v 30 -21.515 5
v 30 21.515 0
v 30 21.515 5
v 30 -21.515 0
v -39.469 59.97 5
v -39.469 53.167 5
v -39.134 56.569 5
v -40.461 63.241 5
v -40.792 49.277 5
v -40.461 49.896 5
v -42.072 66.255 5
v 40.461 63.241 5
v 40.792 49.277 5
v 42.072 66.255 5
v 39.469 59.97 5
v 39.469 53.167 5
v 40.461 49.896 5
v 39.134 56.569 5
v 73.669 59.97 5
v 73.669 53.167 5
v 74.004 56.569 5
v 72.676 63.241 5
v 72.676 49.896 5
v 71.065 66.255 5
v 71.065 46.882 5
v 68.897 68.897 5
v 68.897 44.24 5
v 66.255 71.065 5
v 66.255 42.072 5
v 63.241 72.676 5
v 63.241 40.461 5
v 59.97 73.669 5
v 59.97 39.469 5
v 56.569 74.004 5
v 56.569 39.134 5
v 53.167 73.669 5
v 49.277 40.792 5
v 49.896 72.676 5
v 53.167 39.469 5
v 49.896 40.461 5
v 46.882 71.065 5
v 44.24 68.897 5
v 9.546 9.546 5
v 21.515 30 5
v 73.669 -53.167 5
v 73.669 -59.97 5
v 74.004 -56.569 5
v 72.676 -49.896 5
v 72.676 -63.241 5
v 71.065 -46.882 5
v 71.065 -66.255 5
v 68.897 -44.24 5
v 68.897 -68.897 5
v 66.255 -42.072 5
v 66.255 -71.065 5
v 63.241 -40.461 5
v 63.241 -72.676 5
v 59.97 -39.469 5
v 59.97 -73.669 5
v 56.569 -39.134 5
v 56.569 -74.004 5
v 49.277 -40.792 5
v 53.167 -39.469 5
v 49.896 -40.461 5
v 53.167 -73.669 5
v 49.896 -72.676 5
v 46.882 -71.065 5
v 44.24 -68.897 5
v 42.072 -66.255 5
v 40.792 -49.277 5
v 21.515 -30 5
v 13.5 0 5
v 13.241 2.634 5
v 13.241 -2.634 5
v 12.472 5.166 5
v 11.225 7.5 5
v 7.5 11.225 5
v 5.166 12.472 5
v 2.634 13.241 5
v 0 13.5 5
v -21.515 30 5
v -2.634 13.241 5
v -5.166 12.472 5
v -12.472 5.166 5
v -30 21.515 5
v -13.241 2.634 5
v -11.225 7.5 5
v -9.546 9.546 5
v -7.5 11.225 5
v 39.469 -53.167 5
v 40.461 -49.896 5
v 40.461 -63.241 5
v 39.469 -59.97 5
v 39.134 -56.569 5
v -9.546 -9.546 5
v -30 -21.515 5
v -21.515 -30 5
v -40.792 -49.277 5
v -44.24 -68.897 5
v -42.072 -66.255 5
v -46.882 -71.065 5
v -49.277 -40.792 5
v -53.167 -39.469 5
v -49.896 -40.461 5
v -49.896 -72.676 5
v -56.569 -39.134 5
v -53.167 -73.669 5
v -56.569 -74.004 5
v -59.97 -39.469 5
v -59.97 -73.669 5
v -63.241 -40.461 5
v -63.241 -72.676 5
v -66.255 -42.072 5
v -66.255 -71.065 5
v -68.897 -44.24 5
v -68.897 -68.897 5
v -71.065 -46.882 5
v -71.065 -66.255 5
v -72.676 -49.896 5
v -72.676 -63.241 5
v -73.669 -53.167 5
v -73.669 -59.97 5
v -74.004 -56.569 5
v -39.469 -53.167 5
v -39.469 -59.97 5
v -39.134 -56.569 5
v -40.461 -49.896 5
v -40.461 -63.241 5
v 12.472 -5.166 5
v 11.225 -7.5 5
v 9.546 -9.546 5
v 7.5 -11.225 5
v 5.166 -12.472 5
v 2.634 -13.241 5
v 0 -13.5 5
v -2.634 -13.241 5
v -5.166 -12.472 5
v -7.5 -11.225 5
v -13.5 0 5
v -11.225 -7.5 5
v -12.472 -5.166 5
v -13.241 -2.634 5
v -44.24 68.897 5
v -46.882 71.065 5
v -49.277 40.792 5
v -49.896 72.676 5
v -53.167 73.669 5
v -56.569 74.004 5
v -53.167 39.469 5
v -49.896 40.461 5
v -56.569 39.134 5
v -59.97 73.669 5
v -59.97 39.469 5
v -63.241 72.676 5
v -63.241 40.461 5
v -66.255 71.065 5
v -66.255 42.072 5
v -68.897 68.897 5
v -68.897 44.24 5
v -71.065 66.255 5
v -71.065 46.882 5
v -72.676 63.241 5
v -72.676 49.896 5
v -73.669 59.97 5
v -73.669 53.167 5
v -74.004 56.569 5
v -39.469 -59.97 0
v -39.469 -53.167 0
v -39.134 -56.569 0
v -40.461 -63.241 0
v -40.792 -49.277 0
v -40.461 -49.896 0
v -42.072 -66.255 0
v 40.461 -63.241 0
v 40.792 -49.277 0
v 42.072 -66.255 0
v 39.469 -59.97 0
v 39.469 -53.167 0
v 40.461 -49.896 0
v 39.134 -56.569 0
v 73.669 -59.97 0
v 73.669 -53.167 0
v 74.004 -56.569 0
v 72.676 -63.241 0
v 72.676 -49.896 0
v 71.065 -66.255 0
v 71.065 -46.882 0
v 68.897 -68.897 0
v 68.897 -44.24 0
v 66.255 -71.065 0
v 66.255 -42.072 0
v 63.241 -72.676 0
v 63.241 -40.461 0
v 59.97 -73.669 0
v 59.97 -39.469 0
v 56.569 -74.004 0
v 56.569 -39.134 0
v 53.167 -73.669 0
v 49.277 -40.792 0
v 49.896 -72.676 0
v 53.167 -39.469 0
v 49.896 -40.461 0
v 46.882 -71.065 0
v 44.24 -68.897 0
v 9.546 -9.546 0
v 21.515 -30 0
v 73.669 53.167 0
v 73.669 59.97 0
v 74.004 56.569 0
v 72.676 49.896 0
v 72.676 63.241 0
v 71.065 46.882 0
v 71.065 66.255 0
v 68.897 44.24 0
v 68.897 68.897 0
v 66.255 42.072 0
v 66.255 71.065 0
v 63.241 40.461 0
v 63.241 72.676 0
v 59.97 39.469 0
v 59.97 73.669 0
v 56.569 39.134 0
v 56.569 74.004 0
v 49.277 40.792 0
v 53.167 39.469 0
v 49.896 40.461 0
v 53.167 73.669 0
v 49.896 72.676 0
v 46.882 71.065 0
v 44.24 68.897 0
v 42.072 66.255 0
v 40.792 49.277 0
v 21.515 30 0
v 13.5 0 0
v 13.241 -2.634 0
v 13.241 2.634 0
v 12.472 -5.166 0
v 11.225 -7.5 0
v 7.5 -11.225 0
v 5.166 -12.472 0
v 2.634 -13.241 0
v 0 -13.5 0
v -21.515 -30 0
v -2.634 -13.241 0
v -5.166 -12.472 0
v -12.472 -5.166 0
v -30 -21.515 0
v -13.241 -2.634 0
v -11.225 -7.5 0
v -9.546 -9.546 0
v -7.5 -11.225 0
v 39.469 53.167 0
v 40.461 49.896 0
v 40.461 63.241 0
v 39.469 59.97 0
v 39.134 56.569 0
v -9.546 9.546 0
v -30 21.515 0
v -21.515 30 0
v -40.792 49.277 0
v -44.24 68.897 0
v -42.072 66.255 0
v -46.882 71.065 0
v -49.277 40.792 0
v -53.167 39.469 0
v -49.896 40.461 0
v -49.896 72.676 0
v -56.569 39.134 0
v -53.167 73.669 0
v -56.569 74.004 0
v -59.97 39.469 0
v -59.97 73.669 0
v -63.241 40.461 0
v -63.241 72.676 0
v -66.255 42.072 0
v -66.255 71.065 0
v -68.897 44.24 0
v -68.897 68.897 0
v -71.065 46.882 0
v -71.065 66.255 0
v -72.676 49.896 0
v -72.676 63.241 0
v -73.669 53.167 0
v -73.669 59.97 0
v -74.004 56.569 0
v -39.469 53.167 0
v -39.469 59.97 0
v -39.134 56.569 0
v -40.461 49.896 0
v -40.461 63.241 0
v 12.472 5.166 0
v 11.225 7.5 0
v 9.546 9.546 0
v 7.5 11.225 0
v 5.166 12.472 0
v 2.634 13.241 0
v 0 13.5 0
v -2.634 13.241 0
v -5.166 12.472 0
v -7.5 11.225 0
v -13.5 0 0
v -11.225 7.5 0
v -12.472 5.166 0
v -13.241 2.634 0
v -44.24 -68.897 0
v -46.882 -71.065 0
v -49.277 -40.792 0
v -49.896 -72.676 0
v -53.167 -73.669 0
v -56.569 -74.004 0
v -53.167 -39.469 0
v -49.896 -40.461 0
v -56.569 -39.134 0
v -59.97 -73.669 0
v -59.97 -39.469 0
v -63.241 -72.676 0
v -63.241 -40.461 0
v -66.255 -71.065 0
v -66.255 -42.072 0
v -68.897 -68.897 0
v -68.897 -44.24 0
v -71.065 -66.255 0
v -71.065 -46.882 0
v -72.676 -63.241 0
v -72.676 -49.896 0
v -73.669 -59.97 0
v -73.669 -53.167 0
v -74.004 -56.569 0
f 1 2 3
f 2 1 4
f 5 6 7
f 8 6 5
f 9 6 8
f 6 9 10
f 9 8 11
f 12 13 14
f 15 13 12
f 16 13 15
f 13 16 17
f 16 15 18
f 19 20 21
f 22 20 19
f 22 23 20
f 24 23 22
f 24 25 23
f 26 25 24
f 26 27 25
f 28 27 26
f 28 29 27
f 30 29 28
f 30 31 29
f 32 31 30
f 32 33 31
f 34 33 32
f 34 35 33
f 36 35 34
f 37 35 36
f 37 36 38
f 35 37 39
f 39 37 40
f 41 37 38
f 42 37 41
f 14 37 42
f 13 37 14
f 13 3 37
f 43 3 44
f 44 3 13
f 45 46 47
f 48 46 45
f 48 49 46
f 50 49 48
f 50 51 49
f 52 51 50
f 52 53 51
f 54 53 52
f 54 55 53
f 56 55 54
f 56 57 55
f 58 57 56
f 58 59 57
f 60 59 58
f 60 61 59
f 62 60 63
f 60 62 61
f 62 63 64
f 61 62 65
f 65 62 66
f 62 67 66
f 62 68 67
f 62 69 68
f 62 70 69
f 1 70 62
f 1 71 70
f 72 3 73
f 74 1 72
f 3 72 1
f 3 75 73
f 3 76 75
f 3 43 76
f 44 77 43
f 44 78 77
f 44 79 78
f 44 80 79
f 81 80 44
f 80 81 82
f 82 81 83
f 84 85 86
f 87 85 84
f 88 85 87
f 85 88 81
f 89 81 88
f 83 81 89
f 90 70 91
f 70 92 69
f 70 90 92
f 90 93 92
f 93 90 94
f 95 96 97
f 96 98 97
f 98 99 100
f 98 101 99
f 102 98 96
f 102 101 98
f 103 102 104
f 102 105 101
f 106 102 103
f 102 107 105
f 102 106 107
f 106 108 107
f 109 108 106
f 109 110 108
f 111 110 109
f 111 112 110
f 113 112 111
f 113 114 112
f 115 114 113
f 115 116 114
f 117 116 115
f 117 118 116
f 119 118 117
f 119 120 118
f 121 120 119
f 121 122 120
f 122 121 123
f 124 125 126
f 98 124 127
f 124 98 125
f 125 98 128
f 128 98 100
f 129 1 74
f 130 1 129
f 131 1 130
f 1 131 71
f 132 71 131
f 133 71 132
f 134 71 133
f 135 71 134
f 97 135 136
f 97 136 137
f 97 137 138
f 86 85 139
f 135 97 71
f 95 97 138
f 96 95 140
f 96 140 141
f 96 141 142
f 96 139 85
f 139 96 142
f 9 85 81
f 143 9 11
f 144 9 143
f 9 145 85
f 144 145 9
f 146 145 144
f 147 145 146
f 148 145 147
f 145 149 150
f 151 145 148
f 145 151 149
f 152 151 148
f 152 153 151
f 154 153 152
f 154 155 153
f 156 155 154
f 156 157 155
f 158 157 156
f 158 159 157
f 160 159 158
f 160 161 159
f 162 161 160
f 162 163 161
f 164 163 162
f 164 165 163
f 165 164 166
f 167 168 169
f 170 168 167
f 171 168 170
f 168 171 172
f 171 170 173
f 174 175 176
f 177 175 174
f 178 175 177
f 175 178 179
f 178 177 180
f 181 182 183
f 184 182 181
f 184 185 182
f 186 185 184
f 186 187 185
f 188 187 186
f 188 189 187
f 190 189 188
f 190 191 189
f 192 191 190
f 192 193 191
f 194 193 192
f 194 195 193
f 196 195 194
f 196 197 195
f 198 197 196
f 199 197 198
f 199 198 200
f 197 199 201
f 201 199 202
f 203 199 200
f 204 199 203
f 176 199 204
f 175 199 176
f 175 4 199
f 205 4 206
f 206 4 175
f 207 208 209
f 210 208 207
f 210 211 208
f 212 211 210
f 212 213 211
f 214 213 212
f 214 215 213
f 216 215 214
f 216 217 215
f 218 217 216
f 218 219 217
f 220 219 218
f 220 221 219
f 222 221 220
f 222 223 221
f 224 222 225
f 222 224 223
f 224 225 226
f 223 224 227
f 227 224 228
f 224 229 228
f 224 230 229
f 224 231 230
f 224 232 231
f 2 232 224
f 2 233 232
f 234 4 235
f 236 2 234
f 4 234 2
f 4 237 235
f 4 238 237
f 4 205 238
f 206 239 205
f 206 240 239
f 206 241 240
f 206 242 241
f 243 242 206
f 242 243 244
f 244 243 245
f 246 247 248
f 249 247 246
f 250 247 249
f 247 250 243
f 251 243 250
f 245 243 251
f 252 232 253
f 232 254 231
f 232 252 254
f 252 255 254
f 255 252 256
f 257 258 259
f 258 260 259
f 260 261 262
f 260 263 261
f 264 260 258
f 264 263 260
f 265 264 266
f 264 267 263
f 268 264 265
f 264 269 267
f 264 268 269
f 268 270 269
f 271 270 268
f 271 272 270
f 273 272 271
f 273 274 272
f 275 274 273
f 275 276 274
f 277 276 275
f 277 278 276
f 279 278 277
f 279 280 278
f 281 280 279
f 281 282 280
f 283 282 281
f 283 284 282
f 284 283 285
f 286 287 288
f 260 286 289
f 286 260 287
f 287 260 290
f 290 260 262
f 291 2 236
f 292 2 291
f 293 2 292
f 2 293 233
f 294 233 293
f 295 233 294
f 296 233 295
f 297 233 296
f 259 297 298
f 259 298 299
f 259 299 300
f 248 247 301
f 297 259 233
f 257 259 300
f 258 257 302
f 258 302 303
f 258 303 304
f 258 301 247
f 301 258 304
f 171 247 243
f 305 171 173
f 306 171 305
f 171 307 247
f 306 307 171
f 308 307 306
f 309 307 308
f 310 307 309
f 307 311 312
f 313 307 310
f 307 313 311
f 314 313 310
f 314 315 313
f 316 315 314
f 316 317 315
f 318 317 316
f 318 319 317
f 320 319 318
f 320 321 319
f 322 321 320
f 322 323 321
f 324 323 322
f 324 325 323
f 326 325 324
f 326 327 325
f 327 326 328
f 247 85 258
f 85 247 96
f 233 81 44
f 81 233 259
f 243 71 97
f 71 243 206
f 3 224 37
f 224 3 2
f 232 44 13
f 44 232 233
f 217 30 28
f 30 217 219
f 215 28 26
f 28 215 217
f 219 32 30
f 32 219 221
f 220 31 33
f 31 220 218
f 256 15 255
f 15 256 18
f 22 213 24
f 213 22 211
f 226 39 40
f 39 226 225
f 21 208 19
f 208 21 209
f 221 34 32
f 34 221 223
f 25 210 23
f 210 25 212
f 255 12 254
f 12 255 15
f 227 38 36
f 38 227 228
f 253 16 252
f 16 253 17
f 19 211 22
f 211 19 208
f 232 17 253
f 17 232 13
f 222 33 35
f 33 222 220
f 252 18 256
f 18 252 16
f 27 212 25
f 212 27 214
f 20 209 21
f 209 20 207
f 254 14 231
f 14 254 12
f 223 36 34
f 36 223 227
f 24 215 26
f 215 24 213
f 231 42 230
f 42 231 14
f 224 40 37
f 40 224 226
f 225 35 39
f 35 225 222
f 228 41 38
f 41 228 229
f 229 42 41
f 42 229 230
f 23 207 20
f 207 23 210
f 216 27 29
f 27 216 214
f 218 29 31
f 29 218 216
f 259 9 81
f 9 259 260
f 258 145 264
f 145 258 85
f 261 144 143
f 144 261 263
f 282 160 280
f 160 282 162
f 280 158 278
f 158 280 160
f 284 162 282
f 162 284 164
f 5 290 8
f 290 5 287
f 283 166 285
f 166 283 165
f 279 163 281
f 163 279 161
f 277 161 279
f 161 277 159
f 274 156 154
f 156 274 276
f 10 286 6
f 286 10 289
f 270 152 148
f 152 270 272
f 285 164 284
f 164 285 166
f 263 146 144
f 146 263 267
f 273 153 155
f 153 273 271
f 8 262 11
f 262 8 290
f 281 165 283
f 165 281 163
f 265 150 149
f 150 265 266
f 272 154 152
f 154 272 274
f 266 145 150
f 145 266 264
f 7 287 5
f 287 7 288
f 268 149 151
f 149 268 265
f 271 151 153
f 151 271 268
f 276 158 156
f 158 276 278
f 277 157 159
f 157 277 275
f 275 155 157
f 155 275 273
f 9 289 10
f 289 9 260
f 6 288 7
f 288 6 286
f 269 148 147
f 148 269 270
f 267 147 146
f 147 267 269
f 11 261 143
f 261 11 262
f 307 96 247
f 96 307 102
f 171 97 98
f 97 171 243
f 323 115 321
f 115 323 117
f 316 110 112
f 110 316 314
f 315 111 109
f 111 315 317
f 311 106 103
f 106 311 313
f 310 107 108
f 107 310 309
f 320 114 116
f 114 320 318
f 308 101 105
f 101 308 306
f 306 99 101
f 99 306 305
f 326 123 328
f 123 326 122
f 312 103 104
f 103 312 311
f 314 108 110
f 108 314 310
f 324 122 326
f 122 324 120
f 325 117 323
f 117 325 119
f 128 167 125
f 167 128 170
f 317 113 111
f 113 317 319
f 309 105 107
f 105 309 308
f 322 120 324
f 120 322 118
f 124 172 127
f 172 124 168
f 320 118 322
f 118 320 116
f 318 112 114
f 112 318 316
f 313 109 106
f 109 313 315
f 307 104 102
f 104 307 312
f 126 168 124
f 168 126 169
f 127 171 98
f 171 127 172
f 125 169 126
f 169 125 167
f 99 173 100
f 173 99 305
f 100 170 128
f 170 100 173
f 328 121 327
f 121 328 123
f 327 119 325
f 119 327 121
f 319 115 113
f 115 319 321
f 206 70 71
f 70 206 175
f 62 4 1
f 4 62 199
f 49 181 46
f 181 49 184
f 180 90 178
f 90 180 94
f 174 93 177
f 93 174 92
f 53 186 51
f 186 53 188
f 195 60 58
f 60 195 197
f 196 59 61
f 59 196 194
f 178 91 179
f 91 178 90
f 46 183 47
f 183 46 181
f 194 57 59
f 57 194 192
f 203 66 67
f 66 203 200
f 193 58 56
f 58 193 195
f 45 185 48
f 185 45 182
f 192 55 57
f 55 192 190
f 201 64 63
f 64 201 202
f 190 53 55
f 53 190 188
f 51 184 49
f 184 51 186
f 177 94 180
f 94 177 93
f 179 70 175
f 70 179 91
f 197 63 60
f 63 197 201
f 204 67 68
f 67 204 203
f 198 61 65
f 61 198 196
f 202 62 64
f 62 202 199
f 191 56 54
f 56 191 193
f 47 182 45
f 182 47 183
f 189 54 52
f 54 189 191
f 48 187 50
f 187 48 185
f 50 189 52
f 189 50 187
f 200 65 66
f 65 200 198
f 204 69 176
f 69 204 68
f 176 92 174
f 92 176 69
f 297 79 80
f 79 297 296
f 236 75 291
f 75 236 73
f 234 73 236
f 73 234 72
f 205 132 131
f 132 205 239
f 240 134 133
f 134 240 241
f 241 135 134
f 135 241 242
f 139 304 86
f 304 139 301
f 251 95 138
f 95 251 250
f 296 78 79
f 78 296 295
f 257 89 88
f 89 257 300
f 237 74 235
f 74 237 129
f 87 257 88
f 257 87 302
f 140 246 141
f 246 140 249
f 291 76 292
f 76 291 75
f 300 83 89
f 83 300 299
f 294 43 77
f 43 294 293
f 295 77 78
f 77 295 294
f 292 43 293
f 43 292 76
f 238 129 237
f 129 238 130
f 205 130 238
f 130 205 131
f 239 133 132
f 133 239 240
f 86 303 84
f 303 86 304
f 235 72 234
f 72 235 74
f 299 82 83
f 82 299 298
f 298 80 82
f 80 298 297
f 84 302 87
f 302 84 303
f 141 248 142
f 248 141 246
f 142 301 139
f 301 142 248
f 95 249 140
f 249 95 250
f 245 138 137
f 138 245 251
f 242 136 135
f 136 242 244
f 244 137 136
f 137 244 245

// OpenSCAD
$fn = 32;

// ----------------------------------------------------------------------
// Quadcopter frame: 194.88 mm across the motor pads, arms 80 mm
// ----------------------------------------------------------------------

// --- parameters (mm) ---
hub = 60;                 // central plate size
plate_t = 5;              // plate thickness
arm_len = 80;             // hub centre to motor pad centre
bar_w = 12;               // arm width
pad_d = 34.87;            // motor pad diameter
centre_d = 27;            // central cut-out for the stack

module arm_bar() {
  /* flat bar: hull of a stub inside the hub and a box at the pad */
  hull() {
    translate([hub / 4, 0, plate_t / 2]) cube([bar_w, bar_w, plate_t], center = true);
    translate([arm_len, 0, plate_t / 2]) cube([bar_w, bar_w, plate_t], center = true);
  }
}

module pad() {
  translate([arm_len, 0, 0]) cylinder(h = plate_t, d = pad_d);
}

module frame() {
  translate([-hub / 2, -hub / 2, 0]) cube([hub, hub, plate_t]);
  rotate([0, 0, 45]) arm_bar();
  rotate([0, 0, 45]) pad();
  rotate([0, 0, 135]) arm_bar();
  rotate([0, 0, 135]) pad();
  rotate([0, 0, 225]) arm_bar();
  rotate([0, 0, 225]) pad();
  rotate([0, 0, 315]) arm_bar();
  rotate([0, 0, 315]) pad();
}

difference() {
  frame();
  translate([0, 0, -1]) cylinder(h = plate_t + 2, d = centre_d);
}
